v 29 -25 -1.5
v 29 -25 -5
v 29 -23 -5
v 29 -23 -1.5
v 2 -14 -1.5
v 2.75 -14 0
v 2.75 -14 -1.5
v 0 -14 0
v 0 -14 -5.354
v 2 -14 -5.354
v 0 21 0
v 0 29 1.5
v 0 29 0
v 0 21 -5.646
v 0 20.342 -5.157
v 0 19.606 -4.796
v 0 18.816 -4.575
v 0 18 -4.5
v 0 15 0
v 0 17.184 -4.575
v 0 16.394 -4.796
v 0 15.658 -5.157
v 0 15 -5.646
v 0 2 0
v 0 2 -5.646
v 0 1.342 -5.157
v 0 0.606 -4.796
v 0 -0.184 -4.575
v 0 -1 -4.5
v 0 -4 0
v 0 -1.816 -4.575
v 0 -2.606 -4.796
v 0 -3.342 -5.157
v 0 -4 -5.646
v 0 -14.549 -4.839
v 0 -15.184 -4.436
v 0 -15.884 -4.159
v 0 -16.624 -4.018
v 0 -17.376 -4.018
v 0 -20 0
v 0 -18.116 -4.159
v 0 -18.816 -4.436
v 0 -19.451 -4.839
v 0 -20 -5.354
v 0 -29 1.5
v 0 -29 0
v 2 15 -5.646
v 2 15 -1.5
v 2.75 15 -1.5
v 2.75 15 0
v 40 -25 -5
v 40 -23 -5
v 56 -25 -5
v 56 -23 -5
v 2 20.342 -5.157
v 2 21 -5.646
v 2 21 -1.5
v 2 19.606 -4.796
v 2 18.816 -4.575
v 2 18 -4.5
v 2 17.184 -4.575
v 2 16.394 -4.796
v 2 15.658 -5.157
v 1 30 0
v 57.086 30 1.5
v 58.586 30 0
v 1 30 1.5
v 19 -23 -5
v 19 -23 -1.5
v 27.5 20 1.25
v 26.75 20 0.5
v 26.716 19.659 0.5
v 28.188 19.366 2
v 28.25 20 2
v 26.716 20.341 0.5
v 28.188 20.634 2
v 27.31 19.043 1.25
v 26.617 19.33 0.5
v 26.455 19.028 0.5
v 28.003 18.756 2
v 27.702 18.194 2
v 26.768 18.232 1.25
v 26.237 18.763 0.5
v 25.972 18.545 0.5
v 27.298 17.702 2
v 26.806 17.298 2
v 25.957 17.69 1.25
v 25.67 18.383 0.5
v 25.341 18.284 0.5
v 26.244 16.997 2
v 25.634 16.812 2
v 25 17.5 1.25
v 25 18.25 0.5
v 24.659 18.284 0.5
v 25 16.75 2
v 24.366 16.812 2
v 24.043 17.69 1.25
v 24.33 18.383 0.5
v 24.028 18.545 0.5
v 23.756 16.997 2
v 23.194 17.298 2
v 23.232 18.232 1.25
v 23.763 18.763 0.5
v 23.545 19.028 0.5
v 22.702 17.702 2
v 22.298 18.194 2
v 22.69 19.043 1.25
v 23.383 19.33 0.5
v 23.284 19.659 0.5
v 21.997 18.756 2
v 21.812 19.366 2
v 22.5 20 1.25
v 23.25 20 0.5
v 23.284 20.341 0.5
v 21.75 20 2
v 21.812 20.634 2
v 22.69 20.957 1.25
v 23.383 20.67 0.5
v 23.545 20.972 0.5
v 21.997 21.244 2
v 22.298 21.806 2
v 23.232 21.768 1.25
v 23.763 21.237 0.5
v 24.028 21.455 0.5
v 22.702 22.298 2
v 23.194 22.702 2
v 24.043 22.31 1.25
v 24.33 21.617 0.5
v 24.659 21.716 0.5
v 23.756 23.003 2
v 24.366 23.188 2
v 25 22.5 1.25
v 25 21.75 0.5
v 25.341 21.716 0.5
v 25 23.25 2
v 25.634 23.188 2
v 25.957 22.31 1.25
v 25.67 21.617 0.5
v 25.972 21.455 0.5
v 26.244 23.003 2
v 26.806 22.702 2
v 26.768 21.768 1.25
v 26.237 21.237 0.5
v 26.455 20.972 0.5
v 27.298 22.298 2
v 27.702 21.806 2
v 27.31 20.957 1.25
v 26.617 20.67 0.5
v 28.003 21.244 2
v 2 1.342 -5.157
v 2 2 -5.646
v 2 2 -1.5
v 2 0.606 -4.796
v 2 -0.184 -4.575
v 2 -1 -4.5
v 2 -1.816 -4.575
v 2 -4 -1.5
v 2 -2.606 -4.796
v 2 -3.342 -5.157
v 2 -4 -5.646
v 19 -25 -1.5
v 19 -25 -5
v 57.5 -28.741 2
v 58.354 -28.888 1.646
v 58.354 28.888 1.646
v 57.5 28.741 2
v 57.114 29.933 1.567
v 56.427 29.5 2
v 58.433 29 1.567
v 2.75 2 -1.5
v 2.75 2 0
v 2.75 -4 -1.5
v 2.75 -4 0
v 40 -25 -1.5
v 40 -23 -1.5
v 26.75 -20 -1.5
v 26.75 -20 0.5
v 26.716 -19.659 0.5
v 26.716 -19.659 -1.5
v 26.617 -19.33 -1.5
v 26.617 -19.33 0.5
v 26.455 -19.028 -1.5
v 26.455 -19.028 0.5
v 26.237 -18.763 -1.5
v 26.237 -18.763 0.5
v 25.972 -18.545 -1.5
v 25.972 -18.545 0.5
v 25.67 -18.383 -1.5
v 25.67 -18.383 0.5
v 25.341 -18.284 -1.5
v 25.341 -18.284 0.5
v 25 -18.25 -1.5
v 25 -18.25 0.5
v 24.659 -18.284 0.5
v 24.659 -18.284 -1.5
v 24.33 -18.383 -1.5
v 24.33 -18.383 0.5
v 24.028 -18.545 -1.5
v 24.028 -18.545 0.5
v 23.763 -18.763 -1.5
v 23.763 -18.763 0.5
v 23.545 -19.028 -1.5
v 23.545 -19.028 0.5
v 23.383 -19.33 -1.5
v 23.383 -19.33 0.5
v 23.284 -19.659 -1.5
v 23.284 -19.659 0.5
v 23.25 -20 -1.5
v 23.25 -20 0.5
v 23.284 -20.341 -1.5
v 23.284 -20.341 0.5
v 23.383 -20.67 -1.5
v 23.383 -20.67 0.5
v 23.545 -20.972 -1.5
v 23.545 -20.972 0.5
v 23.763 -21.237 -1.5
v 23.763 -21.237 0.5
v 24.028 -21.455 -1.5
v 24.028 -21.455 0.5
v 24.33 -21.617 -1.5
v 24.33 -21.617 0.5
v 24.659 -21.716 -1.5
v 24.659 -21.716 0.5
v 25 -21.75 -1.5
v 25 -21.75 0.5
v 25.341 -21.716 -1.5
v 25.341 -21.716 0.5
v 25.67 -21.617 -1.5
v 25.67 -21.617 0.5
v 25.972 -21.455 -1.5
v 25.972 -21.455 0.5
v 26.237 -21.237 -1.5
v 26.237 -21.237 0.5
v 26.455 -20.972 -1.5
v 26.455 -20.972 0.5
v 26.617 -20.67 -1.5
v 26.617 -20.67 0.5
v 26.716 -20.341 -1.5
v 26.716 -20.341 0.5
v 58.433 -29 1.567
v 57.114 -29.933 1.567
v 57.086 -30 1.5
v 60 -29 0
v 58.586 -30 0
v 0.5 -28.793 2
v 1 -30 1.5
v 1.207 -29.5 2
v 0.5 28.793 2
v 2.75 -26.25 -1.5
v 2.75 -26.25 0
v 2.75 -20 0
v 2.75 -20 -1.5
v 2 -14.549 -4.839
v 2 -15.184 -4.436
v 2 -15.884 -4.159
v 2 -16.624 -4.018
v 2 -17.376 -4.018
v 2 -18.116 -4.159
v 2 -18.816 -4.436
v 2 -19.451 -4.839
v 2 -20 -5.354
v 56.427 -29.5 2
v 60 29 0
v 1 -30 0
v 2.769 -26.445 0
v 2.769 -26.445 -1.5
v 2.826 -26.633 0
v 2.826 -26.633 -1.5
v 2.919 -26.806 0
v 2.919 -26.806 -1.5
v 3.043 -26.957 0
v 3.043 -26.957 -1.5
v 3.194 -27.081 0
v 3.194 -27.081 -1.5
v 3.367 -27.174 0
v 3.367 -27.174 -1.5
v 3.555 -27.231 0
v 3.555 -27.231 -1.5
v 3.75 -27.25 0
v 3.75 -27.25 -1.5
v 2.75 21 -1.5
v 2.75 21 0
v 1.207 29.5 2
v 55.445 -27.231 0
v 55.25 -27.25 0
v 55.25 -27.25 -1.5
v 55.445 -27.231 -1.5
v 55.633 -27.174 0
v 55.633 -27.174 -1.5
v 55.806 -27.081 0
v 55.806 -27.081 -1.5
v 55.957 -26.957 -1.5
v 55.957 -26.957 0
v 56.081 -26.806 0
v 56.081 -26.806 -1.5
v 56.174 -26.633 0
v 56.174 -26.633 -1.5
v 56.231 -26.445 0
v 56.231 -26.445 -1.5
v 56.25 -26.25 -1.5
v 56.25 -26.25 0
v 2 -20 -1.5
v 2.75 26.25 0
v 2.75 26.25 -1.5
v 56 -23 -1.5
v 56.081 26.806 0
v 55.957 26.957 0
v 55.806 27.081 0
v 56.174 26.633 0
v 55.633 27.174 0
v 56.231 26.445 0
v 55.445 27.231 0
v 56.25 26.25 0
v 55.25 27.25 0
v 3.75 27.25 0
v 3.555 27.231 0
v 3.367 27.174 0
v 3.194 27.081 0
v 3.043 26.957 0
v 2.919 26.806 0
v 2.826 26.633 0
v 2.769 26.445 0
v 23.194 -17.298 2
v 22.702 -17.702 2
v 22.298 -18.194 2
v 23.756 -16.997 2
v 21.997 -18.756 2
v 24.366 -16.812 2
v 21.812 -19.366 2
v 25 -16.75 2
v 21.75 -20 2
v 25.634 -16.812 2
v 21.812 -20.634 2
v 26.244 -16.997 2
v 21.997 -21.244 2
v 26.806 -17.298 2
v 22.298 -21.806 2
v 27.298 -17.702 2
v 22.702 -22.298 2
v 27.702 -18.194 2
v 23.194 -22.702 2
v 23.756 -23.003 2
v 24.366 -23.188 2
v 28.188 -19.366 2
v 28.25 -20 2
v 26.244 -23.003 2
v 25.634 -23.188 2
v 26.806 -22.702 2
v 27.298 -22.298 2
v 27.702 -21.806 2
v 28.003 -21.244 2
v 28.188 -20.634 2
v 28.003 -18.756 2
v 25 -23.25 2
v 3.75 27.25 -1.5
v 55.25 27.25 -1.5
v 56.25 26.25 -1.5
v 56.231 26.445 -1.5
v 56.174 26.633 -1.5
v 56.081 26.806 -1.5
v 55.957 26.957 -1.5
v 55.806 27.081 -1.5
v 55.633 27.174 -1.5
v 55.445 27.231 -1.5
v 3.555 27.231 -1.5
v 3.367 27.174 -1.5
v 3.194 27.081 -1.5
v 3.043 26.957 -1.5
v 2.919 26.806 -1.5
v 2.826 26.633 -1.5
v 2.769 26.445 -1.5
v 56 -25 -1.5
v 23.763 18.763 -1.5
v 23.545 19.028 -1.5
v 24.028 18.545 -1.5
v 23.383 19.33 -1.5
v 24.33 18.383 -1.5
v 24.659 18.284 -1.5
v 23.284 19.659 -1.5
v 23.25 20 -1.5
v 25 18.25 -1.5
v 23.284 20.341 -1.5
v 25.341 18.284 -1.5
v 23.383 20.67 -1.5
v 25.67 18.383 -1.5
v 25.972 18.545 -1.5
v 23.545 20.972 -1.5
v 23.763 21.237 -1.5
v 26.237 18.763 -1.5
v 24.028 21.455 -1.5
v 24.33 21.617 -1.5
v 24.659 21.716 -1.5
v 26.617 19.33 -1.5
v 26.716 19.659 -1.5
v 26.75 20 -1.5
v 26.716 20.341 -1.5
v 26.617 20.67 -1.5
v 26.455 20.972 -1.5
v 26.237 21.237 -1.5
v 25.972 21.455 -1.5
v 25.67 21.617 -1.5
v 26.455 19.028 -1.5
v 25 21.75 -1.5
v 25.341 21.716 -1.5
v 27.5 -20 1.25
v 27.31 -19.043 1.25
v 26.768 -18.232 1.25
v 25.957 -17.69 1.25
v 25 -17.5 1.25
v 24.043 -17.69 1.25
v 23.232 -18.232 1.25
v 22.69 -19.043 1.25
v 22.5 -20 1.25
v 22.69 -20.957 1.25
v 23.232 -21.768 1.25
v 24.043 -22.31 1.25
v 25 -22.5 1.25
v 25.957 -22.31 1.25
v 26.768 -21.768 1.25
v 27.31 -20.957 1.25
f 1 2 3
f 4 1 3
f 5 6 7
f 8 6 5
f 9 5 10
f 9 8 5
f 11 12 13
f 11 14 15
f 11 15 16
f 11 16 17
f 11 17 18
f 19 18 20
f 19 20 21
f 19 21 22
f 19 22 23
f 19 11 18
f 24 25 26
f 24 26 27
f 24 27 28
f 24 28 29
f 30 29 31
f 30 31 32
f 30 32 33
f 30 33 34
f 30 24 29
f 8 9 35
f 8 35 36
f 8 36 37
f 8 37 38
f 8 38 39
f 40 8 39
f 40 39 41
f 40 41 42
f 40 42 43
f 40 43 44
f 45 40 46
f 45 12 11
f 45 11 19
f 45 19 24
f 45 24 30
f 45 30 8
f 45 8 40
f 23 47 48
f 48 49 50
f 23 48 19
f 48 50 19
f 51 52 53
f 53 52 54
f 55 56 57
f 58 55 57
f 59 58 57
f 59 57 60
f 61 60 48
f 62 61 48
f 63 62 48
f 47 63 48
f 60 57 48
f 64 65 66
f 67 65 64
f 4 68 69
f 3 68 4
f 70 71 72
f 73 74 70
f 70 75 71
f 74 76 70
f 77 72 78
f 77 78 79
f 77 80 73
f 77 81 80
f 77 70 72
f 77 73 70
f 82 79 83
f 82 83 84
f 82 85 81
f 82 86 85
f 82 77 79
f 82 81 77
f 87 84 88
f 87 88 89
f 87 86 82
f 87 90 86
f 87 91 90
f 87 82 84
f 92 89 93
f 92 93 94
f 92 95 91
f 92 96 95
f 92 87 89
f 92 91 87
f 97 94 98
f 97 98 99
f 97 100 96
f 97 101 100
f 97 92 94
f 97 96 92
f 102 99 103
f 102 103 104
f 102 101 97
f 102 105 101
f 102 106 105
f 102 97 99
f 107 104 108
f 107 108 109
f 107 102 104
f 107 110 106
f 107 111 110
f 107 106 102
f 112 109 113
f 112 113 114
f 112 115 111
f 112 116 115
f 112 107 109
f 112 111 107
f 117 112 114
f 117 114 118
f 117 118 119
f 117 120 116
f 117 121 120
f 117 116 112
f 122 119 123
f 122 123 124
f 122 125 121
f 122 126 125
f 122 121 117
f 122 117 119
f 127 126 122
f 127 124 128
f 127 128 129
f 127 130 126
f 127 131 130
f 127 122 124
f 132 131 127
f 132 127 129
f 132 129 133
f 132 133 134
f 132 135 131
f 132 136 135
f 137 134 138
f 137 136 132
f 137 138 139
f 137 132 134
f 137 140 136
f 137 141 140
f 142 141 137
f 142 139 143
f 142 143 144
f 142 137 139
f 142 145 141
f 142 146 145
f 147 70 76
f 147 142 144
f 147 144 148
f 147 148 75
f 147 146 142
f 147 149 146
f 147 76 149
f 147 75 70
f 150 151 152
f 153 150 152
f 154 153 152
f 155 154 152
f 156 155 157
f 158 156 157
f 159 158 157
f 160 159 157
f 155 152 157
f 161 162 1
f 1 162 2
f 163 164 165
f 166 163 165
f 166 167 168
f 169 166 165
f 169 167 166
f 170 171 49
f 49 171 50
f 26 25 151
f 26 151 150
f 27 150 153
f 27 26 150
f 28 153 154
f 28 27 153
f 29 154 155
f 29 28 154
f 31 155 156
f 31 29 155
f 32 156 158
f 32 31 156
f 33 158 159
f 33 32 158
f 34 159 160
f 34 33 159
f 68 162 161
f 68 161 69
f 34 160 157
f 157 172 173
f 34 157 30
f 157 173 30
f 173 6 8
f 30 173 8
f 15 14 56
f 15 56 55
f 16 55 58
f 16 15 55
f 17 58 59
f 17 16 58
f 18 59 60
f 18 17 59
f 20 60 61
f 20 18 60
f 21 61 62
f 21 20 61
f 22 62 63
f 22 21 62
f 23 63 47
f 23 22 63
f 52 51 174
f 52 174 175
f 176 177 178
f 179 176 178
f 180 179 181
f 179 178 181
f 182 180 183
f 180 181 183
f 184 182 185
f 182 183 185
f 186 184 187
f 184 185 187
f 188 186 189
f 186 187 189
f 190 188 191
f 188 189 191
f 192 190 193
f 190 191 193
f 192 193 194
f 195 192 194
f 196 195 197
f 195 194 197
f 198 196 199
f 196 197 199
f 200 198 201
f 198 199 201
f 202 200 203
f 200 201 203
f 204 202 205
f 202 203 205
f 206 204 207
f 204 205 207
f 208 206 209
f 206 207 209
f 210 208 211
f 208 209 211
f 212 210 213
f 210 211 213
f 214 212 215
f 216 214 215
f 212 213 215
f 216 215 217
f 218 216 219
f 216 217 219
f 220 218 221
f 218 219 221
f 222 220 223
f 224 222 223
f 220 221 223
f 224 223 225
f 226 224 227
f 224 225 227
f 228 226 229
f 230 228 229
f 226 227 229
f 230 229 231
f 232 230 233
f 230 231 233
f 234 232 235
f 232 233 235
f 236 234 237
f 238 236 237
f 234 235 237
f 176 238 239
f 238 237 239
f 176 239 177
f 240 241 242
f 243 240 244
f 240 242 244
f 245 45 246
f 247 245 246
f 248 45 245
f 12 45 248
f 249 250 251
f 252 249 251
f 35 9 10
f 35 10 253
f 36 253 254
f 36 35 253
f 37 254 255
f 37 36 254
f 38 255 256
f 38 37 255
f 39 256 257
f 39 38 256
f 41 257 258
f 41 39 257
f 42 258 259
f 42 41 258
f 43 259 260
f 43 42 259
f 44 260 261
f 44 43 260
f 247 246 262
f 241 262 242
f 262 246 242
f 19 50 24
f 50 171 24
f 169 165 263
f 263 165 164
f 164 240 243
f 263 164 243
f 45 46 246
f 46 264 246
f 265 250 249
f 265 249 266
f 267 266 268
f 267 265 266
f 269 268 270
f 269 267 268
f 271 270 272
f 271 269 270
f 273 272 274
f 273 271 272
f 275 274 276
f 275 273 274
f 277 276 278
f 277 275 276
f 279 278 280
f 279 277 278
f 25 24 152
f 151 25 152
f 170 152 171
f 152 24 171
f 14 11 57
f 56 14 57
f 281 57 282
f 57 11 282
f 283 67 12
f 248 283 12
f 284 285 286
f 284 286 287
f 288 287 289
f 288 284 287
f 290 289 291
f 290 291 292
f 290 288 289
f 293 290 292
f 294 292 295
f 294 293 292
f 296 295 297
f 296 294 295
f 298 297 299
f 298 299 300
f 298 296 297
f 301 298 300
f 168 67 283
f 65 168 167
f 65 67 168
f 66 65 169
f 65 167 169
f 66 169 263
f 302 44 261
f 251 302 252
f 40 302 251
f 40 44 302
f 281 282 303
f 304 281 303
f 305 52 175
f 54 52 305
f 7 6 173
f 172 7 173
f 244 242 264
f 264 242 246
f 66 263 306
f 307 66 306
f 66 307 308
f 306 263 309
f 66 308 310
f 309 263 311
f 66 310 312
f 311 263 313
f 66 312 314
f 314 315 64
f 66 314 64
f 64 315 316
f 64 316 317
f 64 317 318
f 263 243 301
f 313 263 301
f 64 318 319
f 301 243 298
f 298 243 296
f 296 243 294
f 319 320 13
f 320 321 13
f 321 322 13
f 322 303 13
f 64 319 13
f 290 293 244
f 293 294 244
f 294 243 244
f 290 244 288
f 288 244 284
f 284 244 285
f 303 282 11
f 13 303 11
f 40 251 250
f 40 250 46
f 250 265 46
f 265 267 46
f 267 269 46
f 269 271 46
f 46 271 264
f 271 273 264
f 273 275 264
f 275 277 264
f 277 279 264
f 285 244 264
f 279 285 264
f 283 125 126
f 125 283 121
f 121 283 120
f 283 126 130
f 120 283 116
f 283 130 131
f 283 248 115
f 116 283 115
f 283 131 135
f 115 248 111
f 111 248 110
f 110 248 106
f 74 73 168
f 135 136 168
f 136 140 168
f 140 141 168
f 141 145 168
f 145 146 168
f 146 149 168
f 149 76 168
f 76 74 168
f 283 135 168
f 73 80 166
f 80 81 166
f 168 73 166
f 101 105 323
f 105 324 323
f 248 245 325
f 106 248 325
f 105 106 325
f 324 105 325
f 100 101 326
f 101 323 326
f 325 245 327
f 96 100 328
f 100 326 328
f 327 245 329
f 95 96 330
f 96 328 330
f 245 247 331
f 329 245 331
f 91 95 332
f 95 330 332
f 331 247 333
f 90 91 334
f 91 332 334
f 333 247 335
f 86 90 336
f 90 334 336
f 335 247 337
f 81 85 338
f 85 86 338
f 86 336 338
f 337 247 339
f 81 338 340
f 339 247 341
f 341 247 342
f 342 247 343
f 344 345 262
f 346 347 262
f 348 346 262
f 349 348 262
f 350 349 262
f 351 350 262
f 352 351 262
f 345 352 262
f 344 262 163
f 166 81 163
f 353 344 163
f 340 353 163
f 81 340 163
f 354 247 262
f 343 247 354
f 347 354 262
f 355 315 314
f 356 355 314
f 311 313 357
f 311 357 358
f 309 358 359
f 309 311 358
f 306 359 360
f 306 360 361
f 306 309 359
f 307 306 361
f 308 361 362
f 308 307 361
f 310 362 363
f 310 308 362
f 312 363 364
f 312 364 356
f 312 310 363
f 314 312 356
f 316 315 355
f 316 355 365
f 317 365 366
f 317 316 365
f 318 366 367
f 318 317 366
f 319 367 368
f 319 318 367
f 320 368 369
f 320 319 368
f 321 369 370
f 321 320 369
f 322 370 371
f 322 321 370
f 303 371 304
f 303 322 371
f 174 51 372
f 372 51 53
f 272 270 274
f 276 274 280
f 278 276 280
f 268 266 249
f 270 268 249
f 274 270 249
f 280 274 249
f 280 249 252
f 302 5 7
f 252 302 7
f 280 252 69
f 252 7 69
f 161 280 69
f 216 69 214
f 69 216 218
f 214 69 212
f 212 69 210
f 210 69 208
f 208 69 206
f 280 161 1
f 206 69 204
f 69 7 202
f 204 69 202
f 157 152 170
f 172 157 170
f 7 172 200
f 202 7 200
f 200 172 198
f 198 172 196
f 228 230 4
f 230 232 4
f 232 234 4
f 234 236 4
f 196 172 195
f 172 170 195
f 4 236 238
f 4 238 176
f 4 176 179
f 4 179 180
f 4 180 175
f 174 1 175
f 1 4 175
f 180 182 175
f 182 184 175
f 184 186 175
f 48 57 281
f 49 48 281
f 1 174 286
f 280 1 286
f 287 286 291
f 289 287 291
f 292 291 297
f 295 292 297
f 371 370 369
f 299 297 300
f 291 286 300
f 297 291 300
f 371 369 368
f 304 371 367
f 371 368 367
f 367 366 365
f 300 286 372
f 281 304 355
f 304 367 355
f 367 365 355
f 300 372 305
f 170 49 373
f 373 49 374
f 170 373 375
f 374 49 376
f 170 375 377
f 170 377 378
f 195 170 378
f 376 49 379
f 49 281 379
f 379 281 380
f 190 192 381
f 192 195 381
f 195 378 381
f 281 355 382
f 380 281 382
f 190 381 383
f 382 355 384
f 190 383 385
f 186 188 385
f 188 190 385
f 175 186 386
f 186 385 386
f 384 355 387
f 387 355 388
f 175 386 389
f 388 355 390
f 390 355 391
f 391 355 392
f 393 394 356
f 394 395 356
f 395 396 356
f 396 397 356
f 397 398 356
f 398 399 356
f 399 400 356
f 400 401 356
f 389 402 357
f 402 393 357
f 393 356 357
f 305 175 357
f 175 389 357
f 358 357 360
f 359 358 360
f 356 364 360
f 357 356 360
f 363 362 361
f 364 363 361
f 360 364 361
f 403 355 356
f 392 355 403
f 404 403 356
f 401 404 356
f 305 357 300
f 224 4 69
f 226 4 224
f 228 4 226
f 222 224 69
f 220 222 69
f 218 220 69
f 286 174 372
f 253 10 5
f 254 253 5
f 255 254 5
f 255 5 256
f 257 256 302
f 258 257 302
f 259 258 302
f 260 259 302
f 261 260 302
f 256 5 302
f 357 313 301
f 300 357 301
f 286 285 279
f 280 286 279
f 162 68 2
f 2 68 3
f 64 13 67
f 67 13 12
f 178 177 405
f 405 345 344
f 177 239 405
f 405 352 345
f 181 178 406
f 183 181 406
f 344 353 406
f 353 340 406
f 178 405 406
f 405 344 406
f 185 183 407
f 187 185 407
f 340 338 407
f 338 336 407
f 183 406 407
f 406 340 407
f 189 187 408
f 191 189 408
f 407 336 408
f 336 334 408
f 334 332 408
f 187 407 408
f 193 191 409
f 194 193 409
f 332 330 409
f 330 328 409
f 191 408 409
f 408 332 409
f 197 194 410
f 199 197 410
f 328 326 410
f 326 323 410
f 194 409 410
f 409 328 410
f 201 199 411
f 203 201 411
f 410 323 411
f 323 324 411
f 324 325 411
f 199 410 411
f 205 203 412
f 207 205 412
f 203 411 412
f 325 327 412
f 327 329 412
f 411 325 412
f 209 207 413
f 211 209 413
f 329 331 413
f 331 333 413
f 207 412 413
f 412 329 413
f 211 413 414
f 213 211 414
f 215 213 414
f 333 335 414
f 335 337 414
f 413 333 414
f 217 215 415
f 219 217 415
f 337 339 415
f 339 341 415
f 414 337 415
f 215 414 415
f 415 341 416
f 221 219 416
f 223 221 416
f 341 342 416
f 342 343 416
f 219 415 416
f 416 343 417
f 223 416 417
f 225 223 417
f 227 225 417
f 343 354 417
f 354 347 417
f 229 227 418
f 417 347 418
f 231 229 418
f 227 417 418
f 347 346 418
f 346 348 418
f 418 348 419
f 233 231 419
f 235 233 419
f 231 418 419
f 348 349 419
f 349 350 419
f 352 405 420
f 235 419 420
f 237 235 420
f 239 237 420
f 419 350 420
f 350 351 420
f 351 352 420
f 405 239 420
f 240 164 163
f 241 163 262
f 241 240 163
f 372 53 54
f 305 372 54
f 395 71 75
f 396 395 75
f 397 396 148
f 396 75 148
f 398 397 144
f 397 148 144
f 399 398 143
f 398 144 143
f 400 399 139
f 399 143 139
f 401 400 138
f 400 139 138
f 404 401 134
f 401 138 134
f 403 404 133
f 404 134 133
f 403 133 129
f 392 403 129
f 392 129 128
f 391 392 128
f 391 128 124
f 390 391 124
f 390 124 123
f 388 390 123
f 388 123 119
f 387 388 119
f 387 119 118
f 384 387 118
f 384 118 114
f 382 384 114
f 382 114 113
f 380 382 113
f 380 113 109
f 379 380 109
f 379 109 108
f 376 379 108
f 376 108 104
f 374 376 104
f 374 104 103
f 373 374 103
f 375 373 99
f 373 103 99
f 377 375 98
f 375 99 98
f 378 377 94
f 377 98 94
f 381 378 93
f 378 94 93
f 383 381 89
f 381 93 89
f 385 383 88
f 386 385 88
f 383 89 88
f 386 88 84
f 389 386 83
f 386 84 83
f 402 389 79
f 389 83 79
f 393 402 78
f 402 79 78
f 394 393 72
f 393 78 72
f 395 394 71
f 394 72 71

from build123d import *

# Parameters (mm, degrees)
PAD007_DEPTH    = 30
PAD004_DEPTH    = 1.5
PAD006_DEPTH    = 2
SKETCH016_R     = 1.75
POCKET009_DEPTH = 2.5
SKETCH018_W     = 10
SKETCH018_H     = 2
SKETCH018_W_2   = 16
PAD008_DEPTH    = 4
CHAMFER001_SIZE = 1.5
CHAMFER002_SIZE = 1
CHAMFER003_SIZE = 0.5


with BuildPart() as part:
    # Sketch017 → Pad007 (new body, symmetric)
    with BuildSketch(Plane.XZ):
        Polygon((0, 0), (0, 2), (58, 2), (60, 0), align=None)
    extrude(amount=PAD007_DEPTH, both=True)

    # Sketch013 → Pad004 (join)
    with BuildSketch(Plane.XY):
        with BuildLine():
            ThreePointArc((3.75, 27.25), (3.042893, 26.957107), (2.75, 26.25))
            Line((2.75, 21), (2.75, 26.25))
            Line((0, 21), (2.75, 21))
            Line((0, 15), (0, 21))
            Line((2.75, 15), (0, 15))
            Line((2.75, 2), (2.75, 15))
            Line((0, 2), (2.75, 2))
            Line((0, -4), (0, 2))
            Line((2.75, -4), (0, -4))
            Line((2.75, -14), (2.75, -4))
            Line((0, -14), (2.75, -14))
            Line((0, -20), (0, -14))
            Line((2.75, -20), (0, -20))
            Line((2.75, -26.25), (2.75, -20))
            ThreePointArc((2.75, -26.25), (3.042893, -26.957107), (3.75, -27.25))
            Line((55.25, -27.25), (3.75, -27.25))
            ThreePointArc((55.25, -27.25), (55.957107, -26.957107), (56.25, -26.25))
            Line((56.25, 26.25), (56.25, -26.25))
            ThreePointArc((56.25, 26.25), (55.957107, 26.957107), (55.25, 27.25))
            Line((3.75, 27.25), (55.25, 27.25))
        make_face()
    extrude(amount=-PAD004_DEPTH)

    # Sketch015 → Pad006 (join)
    with BuildSketch(Plane.YZ):
        with BuildLine():
            ThreePointArc((-14, -5.354249), (-17, -4), (-20, -5.354249))
            Line((-20, -5.354249), (-20, 0))
            Line((-20, 0), (-14, 0))
            Line((-14, 0), (-14, -5.354249))
        make_face()
        with BuildLine():
            ThreePointArc((2, -5.645898), (-1, -4.5), (-4, -5.645898))
            Line((-4, -5.645898), (-4, 0))
            Line((-4, 0), (2, 0))
            Line((2, 0), (2, -5.645898))
        make_face()
        with BuildLine():
            ThreePointArc((21, -5.645898), (18, -4.5), (15, -5.645898))
            Line((15, -5.645898), (15, 0))
            Line((15, 0), (21, 0))
            Line((21, 0), (21, -5.645898))
        make_face()
    extrude(amount=PAD006_DEPTH)

    # Sketch016 → Pocket009 (cut, symmetric)
    with BuildSketch(Plane.XY):
        with Locations((25, 20)):
            Circle(SKETCH016_R)
        with Locations((25, -20)):
            Circle(SKETCH016_R)
    extrude(amount=POCKET009_DEPTH, both=True, mode=Mode.SUBTRACT)

    # Sketch018 → Pad008 (join)
    with BuildSketch(Plane.XY.offset(-5)):
        with Locations((24, -24)):
            Rectangle(SKETCH018_W, SKETCH018_H)
        with Locations((48, -24)):
            Rectangle(SKETCH018_W_2, SKETCH018_H)
    extrude(amount=PAD008_DEPTH)

    # Chamfer001
    chamfer001_edges = [part.edges().sort_by_distance(p)[0] for p in [
        (23.25, 20, 2),
        (23.25, -20, 2),
    ]]
    chamfer(chamfer001_edges, length=CHAMFER001_SIZE)

    # Chamfer002
    chamfer002_edges = [part.edges().sort_by_distance(p)[0] for p in [
        (59, -30, 1),
        (0, -30, 1),
        (0, 30, 1),
        (59, 30, 1),
    ]]
    chamfer(chamfer002_edges, length=CHAMFER002_SIZE)

    # Chamfer003
    chamfer003_edges = [part.edges().sort_by_distance(p)[0] for p in [
        (28.792893, 30, 2),
        (0.5, 29.5, 2),
        (0, 0, 2),
        (0.5, -29.5, 2),
        (28.792893, -30, 2),
        (57.292893, -29.5, 2),
        (58, 0, 2),
        (57.292893, 29.5, 2),
    ]]
    chamfer(chamfer003_edges, length=CHAMFER003_SIZE)


solid = part.part
